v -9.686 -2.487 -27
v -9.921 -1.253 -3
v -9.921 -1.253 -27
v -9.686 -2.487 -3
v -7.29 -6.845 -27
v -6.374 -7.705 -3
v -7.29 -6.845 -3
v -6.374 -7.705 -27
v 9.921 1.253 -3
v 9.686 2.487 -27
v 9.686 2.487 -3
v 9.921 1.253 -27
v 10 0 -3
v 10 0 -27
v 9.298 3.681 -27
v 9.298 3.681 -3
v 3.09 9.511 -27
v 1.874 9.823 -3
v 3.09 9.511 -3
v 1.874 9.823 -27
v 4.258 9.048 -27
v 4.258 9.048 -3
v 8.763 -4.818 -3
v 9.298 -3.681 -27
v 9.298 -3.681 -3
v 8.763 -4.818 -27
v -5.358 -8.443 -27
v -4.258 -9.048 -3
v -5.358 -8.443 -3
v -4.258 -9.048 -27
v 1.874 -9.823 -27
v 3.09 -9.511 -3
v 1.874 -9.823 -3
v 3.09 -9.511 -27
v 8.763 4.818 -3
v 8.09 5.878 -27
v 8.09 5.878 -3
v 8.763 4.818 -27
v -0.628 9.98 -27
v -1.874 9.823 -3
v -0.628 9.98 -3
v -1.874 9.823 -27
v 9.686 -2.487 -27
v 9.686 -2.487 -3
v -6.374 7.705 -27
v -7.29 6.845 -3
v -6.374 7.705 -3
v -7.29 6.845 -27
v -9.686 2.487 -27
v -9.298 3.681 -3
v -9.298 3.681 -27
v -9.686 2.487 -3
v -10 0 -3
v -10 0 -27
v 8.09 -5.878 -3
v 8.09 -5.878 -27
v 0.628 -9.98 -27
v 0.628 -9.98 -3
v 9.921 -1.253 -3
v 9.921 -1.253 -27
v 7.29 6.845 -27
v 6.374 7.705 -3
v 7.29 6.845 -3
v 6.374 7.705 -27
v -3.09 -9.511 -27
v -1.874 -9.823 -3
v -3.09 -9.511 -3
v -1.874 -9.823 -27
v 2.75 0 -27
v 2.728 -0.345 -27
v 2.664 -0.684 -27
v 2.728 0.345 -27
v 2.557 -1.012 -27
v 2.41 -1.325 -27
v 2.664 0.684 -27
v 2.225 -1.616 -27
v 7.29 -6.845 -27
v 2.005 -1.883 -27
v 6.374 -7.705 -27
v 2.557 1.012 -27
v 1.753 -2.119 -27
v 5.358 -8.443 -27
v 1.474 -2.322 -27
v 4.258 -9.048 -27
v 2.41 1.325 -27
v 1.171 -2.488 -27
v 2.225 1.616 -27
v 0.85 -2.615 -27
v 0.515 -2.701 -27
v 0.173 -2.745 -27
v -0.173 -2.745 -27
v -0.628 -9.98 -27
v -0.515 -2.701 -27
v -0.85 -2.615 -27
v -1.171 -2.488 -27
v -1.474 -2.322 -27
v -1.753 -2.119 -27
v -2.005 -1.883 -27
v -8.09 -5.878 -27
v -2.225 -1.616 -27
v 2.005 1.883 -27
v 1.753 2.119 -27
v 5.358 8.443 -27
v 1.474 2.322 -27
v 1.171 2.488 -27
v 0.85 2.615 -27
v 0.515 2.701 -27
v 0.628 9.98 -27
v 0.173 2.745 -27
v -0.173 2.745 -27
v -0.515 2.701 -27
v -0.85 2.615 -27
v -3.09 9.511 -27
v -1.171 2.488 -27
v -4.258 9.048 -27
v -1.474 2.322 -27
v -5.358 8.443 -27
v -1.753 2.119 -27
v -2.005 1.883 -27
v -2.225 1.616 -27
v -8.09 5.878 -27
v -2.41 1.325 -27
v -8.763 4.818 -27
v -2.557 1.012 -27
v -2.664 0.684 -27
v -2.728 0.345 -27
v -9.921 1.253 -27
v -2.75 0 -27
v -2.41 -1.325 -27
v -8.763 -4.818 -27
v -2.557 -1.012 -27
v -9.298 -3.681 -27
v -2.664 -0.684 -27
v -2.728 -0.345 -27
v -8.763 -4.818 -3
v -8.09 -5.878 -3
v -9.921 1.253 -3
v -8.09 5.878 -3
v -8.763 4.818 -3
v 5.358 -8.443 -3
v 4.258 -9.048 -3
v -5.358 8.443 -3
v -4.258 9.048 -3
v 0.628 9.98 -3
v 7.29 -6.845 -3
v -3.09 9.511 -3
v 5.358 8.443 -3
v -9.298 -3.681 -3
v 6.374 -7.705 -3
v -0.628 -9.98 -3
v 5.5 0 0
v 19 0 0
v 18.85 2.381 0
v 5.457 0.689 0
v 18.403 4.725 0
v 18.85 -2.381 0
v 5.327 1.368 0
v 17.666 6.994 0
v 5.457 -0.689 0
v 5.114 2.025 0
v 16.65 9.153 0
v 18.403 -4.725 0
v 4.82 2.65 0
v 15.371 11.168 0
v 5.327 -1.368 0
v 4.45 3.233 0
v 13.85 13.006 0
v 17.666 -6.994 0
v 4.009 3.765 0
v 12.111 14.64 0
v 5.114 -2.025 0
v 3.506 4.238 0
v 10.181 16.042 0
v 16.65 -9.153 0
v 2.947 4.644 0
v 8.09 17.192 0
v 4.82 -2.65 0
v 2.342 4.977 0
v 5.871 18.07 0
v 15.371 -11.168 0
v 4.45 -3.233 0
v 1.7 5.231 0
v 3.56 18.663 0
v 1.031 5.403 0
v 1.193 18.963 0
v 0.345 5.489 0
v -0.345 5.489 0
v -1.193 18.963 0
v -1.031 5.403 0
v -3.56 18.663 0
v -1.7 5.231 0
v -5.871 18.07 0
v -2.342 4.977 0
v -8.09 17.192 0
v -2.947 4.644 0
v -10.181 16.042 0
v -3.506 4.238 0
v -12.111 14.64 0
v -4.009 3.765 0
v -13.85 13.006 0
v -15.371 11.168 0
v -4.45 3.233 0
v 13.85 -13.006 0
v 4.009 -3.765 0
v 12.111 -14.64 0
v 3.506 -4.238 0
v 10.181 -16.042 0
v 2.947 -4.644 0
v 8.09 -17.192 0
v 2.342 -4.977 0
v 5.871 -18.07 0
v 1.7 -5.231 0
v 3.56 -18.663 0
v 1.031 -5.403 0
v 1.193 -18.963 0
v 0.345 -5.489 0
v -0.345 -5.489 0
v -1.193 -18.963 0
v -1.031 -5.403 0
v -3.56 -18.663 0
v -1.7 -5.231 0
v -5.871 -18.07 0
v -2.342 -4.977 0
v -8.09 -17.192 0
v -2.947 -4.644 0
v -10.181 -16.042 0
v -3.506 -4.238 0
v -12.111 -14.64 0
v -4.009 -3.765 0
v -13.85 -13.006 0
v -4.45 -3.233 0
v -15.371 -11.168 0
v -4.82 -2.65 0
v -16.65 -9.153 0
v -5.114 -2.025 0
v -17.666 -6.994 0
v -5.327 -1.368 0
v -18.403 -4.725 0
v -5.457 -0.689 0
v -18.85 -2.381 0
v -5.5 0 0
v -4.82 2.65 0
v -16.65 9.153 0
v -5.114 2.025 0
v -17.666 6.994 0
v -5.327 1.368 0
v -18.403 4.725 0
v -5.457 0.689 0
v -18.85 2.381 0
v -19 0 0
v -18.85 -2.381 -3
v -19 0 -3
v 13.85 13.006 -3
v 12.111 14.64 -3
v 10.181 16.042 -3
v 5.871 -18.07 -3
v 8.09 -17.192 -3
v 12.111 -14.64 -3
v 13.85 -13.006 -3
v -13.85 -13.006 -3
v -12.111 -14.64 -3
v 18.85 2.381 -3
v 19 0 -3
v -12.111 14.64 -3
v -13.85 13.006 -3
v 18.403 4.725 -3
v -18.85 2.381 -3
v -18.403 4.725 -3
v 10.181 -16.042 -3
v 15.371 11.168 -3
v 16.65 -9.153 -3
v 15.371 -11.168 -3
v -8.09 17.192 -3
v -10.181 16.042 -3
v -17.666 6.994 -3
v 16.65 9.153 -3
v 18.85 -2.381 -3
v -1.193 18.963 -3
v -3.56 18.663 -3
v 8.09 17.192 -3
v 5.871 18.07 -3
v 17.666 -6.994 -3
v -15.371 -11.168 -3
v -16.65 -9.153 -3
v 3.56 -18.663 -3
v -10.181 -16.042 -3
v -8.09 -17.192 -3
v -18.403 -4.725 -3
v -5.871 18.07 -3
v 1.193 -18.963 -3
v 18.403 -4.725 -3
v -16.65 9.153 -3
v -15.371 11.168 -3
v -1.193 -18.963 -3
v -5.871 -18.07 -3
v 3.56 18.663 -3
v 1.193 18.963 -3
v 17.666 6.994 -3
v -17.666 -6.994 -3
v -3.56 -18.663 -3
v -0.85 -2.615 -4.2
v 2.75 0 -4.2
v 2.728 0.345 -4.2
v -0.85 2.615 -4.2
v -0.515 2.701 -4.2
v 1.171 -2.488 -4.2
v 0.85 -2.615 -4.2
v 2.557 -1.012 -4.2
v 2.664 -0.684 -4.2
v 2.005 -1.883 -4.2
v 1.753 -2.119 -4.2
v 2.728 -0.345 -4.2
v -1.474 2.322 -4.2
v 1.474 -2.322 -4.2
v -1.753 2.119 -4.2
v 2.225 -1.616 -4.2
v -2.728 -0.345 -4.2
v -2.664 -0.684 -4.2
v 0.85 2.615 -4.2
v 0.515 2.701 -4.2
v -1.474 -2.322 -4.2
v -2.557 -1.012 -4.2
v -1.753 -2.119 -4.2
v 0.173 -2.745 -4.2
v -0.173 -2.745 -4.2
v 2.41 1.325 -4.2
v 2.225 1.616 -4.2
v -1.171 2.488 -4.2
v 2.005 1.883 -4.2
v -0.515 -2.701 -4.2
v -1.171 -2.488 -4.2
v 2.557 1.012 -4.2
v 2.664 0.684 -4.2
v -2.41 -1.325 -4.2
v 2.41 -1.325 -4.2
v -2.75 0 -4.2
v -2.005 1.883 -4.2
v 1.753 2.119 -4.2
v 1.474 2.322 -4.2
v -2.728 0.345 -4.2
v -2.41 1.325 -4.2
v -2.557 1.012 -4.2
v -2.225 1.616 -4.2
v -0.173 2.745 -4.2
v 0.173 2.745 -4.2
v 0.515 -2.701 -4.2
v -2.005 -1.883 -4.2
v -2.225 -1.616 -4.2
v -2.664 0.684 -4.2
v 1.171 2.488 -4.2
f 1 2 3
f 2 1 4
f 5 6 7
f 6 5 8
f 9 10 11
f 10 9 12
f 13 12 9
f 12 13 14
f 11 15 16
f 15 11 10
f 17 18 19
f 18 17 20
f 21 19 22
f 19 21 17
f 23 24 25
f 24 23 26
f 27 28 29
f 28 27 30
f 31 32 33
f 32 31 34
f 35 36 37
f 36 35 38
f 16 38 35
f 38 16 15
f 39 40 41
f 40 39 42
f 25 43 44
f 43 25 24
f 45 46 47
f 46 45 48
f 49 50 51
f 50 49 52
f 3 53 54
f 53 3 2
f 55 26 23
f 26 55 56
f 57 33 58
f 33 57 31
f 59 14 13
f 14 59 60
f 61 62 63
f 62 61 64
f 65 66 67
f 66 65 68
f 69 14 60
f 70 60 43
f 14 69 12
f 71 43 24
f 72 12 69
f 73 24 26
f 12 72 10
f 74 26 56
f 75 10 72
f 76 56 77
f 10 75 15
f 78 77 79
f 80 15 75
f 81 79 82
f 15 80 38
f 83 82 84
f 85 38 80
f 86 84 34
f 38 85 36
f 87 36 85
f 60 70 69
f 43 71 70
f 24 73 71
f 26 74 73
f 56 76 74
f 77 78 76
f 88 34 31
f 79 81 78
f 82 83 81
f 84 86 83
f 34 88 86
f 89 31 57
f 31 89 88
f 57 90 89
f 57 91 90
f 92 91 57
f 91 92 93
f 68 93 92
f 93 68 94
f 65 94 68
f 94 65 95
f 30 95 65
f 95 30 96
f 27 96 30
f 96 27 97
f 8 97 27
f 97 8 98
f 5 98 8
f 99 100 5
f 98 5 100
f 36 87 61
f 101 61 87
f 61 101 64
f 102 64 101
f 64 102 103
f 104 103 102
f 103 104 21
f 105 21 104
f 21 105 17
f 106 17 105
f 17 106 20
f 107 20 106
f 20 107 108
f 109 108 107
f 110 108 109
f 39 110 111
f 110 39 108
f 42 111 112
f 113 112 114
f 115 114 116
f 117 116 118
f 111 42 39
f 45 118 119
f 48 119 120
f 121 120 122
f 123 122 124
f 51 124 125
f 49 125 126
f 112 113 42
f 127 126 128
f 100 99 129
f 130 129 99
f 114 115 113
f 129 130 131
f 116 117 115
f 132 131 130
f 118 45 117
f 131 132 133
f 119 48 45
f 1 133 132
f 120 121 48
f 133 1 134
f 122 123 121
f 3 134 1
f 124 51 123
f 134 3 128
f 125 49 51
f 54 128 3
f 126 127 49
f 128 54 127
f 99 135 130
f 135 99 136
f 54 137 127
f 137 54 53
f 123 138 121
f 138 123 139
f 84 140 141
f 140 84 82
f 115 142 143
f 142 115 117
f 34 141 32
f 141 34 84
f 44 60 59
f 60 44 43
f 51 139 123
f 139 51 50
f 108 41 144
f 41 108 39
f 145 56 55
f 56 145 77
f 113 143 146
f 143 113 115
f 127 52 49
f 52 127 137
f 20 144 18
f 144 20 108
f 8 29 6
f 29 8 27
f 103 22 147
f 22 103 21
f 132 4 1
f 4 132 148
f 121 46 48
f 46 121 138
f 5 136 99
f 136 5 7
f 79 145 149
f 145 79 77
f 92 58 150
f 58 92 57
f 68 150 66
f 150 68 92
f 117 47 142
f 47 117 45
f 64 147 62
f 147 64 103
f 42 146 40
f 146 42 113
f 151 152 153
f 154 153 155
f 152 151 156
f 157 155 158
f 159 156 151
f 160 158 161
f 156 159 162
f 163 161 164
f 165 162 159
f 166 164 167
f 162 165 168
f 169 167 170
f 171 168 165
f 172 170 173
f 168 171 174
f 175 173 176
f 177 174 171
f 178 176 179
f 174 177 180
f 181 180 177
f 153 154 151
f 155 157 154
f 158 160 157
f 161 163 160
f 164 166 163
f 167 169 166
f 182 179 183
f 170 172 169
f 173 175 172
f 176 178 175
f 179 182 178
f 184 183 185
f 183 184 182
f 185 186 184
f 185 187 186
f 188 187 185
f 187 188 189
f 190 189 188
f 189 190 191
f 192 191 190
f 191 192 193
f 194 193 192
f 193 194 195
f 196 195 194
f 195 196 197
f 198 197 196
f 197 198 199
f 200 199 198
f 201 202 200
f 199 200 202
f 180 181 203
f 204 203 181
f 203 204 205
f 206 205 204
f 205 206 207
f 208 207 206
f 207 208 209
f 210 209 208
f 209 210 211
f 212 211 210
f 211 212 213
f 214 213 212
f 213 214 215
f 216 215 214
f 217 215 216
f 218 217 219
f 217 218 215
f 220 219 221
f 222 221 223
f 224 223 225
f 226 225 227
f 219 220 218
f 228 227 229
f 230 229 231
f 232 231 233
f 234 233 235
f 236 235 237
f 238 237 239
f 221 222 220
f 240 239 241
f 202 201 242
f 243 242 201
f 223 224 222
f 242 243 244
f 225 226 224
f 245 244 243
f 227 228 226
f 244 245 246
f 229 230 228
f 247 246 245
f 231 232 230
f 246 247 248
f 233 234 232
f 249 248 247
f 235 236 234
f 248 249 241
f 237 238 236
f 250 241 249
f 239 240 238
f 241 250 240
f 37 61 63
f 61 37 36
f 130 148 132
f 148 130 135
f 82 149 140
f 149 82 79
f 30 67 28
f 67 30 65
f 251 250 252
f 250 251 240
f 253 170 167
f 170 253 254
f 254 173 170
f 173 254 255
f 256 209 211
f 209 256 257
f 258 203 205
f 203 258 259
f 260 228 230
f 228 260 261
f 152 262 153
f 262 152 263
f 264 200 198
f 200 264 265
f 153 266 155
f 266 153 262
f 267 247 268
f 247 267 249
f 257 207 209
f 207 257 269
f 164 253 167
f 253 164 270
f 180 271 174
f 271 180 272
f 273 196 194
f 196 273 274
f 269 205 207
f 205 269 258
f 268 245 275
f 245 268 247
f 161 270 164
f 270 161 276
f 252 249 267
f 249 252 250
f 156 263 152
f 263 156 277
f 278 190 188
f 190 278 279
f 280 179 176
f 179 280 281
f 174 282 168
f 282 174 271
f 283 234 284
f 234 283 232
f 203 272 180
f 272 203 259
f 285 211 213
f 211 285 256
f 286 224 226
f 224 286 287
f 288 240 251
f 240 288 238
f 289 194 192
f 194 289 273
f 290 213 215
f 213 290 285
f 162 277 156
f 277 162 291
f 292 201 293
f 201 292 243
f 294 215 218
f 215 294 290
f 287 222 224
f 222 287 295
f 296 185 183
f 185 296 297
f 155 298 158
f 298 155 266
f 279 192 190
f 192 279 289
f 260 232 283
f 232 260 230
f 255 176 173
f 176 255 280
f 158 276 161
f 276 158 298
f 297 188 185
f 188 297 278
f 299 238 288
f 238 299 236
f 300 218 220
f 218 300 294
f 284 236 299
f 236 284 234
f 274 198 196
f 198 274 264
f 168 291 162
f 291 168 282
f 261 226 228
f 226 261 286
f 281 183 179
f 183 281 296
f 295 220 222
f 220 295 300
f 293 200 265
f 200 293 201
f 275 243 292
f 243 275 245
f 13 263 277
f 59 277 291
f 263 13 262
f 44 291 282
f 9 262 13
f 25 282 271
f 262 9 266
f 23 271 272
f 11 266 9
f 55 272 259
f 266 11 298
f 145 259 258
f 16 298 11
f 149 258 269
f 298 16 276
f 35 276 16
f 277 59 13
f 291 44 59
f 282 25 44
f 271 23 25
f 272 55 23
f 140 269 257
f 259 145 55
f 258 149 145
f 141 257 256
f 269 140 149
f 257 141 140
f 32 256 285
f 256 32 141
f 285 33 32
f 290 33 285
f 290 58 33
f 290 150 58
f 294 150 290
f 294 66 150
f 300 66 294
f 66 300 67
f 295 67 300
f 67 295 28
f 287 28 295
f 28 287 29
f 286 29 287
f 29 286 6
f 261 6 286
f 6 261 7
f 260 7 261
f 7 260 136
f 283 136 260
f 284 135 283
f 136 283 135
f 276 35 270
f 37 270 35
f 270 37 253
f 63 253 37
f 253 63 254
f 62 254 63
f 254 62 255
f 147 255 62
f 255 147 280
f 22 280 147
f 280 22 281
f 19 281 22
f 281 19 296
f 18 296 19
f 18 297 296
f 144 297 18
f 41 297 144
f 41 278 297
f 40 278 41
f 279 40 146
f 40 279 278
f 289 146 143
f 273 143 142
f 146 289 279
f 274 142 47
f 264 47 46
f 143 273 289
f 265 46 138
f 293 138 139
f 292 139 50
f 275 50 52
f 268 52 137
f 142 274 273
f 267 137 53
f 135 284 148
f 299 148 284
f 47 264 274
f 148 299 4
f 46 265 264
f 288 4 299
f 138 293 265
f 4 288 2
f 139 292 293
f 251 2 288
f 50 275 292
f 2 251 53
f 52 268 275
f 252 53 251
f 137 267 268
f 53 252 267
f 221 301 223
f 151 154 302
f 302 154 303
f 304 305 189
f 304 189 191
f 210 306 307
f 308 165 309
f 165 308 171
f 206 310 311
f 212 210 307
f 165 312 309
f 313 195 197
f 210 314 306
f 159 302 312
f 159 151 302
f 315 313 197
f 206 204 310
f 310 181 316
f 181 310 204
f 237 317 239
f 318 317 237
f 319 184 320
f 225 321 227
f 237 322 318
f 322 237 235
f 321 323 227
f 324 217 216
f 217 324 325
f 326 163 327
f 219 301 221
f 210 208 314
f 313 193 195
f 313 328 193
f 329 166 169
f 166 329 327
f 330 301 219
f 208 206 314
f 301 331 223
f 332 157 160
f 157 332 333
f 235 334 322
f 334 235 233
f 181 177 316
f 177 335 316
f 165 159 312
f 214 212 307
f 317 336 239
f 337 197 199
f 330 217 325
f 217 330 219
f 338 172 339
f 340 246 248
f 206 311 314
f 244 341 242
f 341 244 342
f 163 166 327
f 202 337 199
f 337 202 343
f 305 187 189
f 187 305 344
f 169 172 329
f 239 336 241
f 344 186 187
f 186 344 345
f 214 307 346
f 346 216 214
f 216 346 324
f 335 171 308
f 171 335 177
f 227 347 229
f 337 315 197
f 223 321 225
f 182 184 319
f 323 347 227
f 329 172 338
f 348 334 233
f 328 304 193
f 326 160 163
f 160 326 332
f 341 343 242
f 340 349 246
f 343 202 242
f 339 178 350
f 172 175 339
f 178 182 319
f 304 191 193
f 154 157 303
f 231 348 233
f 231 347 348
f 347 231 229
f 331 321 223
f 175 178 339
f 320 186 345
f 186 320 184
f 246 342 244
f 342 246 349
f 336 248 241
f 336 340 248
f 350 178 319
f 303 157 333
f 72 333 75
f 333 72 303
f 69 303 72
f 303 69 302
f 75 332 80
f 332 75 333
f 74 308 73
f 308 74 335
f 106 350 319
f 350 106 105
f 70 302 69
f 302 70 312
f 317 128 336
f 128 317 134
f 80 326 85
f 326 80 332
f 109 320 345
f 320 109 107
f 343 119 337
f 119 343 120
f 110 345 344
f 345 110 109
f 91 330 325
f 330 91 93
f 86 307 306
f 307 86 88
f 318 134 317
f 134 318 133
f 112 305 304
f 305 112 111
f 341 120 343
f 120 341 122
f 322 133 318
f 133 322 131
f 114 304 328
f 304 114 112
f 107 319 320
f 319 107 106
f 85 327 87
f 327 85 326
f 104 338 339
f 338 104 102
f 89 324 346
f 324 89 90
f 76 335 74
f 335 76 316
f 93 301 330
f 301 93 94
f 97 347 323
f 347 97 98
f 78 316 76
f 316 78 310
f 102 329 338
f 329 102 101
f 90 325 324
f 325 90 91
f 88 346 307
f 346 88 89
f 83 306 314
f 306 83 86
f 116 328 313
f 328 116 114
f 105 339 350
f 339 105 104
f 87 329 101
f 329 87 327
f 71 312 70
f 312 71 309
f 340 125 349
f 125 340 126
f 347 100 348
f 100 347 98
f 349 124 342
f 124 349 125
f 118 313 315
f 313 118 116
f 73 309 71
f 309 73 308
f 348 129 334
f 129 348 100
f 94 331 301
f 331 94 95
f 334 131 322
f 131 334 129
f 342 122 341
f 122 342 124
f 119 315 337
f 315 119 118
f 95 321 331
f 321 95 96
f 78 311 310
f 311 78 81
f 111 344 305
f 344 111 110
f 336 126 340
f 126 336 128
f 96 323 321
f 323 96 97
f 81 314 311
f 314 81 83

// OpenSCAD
$fn = 50;


difference() {
	union() {
		translate(v = [0, 0, -27.0000000000]) {
			cylinder(h = 27, r = 10.0000000000);
		}
		translate(v = [0, 0, -3.0000000000]) {
			cylinder(h = 3, r = 19.0000000000);
		}
	}
	union() {
		translate(v = [0, 0, 0]) {
			rotate(a = [0, 0, 0]) {
				difference() {
					union() {
						#translate(v = [0, 0, -27.0000000000]) {
							cylinder(h = 27, r = 2.2500000000);
						}
						#translate(v = [0, 0, -4.2000000000]) {
							cylinder(h = 4.2000000000, r = 10.0000000000, r1 = 2.7500000000, r2 = 5.5000000000);
						}
						#translate(v = [0, 0, -27.0000000000]) {
							cylinder(h = 27, r = 2.7500000000);
						}
						#translate(v = [0, 0, -27.0000000000]) {
							cylinder(h = 27, r = 2.2500000000);
						}
					}
					union();
				}
			}
		}
	}
}
